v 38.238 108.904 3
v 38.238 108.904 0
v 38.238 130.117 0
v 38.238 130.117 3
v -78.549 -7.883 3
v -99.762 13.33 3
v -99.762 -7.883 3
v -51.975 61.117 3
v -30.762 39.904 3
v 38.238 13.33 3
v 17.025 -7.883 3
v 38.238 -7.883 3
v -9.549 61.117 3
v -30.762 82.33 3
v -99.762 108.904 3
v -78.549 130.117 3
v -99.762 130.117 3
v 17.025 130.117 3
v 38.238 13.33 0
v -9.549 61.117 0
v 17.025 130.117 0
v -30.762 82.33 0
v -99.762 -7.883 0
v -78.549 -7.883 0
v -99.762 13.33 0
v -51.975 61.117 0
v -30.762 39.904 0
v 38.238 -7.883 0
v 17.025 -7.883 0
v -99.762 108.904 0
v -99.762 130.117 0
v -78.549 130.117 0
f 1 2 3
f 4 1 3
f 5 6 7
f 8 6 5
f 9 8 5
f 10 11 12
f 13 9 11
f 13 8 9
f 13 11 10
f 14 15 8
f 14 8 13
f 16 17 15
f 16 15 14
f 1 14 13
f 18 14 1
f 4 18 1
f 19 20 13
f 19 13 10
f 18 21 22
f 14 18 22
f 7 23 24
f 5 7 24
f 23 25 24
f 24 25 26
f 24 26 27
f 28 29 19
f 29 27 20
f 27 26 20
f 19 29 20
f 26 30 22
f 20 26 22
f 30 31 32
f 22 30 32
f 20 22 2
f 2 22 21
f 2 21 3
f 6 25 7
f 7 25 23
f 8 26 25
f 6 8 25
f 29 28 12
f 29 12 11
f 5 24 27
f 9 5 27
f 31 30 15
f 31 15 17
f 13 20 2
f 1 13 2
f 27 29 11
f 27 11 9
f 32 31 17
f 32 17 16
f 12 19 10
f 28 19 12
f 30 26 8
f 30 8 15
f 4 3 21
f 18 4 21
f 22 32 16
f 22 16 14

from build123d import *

# Parameters (mm, degrees)
BOSS_EXTRUDE1_DEPTH = 3
BOSS_EXTRUDE2_DEPTH = 3


with BuildPart() as part:
    # Sketch7 → Boss-Extrude1 (new body)
    with BuildSketch(Plane.XY):
        Polygon((-78.549032868, 130.117059275), (38.237763696, 13.33026271), (38.237763696, -7.882940725), (17.02456026, -7.882940725), (-99.762236304, 108.903855839), (-99.762236304, 130.117059275), align=None)
    extrude(amount=BOSS_EXTRUDE1_DEPTH)

    # Sketch8 → Boss-Extrude2 (add)
    with BuildSketch(Plane.XY):
        Polygon((-78.549032868, -7.882940725), (38.237763696, 108.903855839), (38.237763696, 130.117059275), (17.02456026, 130.117059275), (-99.762236304, 13.33026271), (-99.762236304, -7.882940725), align=None)
    extrude(amount=BOSS_EXTRUDE2_DEPTH)


solid = part.part
